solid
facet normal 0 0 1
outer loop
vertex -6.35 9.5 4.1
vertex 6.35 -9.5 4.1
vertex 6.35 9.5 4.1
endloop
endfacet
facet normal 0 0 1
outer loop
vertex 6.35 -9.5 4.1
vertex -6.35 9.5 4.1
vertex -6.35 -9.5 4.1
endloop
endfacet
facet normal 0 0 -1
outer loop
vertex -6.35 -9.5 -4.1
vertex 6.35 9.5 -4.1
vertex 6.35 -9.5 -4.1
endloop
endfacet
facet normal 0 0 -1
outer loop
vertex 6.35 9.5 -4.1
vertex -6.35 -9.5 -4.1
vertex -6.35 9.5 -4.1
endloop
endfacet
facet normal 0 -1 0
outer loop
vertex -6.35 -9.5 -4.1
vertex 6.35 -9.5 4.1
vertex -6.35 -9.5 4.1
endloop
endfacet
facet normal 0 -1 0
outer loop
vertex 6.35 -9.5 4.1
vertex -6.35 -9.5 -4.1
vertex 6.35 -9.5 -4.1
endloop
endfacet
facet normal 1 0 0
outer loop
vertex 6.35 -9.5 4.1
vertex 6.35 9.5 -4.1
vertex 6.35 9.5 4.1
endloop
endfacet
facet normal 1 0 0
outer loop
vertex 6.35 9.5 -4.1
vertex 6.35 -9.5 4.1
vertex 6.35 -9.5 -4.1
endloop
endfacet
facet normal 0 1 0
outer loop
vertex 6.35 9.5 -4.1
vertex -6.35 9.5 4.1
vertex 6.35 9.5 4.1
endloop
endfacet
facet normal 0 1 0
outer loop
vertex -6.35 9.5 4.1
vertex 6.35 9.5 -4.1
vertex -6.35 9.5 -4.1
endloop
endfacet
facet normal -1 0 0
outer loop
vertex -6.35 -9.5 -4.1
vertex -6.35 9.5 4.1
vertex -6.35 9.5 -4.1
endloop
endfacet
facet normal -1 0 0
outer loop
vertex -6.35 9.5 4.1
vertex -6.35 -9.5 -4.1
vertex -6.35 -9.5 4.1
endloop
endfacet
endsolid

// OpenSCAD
$fn=64;

dims = [12.7, 19, 8.2];

module seven_segment_body(size=[12.7,19,8.2]) {
    translate([-size[0]/2, -size[1]/2, -size[2]/2])
        cube(size, center=false);
}

seven_segment_body(dims);
